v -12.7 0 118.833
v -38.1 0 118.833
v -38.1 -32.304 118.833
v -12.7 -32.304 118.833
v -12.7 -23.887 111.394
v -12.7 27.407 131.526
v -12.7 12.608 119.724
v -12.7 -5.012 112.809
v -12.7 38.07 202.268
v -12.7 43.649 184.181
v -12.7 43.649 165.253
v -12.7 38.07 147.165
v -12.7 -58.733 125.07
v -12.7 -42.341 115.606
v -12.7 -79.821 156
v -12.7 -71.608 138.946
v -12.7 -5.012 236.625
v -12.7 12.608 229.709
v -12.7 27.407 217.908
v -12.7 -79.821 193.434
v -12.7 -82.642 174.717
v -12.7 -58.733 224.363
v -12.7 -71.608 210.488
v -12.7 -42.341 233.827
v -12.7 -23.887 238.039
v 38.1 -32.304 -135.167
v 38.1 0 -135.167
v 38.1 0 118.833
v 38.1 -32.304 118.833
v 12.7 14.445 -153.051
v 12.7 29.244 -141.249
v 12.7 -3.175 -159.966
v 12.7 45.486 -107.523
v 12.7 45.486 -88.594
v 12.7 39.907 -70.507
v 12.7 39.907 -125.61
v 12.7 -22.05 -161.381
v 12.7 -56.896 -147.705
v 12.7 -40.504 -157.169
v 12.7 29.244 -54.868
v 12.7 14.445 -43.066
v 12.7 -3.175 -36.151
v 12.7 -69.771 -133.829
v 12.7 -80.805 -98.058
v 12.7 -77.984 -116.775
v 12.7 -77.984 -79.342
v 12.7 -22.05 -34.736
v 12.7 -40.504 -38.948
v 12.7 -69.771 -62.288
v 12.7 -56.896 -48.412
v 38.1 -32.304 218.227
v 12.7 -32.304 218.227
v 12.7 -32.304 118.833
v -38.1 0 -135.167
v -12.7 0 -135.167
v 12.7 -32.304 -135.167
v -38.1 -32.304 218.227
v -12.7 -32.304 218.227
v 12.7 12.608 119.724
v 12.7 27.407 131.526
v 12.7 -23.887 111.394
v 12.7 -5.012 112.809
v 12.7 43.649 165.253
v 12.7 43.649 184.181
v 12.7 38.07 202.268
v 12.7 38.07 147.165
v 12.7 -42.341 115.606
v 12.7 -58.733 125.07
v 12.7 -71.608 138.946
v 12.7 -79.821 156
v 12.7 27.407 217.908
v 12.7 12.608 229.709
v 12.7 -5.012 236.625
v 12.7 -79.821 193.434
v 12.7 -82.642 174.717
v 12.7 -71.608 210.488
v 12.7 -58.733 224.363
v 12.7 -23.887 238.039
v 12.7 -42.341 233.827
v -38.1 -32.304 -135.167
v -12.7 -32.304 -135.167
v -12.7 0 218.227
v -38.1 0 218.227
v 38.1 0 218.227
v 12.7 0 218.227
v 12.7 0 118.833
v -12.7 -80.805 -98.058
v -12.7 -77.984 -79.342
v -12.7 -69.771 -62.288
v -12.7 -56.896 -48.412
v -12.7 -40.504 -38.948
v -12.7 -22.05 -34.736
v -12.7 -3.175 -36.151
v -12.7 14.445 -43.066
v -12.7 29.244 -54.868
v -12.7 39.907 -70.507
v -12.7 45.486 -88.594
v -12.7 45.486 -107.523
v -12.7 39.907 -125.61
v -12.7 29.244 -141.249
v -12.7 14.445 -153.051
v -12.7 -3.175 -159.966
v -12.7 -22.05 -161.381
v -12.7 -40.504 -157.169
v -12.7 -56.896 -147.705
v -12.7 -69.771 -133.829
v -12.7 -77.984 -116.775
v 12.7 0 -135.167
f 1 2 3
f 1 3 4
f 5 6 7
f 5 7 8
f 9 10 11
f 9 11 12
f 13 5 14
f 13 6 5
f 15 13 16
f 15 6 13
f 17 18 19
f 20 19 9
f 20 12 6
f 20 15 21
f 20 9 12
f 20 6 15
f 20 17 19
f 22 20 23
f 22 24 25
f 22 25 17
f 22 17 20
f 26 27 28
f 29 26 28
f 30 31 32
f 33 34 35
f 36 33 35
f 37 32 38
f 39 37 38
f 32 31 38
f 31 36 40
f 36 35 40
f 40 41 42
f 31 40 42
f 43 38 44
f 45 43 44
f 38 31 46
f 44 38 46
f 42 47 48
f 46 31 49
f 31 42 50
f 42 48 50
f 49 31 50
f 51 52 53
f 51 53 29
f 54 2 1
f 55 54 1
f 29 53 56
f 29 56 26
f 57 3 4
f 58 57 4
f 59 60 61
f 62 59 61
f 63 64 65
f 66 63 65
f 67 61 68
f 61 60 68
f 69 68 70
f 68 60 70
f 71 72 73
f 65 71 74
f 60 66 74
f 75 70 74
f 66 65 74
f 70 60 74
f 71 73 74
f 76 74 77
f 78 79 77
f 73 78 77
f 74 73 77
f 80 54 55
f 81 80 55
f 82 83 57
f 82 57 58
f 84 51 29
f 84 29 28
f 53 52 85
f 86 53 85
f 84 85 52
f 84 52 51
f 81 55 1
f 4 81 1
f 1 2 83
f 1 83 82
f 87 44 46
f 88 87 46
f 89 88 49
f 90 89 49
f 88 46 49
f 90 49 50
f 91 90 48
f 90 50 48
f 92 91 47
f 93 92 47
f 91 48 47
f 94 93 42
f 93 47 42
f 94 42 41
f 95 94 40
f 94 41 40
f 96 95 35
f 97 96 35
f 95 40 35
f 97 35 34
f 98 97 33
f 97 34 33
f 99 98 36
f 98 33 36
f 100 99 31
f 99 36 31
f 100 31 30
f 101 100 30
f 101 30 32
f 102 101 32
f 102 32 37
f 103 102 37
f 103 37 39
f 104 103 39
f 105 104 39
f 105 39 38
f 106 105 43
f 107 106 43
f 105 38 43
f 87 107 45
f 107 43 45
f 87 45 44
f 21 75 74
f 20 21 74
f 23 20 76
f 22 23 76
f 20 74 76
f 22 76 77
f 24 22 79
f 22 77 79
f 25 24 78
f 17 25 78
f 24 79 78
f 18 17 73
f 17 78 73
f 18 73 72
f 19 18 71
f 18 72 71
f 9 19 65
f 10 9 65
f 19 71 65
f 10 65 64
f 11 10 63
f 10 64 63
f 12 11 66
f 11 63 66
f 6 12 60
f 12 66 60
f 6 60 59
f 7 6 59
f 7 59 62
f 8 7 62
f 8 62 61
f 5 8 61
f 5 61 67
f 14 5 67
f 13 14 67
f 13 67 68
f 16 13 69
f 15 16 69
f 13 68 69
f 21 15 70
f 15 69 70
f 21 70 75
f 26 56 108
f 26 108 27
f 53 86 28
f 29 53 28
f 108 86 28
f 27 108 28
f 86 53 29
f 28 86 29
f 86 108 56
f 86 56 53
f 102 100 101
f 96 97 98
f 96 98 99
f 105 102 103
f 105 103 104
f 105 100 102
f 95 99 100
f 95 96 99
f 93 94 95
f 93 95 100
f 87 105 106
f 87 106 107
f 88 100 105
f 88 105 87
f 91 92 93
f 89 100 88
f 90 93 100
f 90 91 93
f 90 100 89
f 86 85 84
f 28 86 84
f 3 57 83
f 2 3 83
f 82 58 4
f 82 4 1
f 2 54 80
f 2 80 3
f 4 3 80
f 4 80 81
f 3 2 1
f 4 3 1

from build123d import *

# Parameters (mm, degrees)
F0_W      = 25.4
F0_H      = 254
F2_DEPTH  = 32.304034
F2_FACE_W = 25.4
F2_FACE_H = 32.304034
F3_DEPTH  = 99.393887
F4_R      = 63.5
F5_DEPTH  = 25.4


with BuildPart() as f2:
    # F0 (on Front) → F2 (new body)
    with BuildSketch(Plane.XZ):
        with Locations((-25.4, -8.166723)):
            Rectangle(F0_W, F0_H)
        with Locations((25.4, -8.166723)):
            Rectangle(F0_W, F0_H)
    extrude(amount=F2_DEPTH)


with BuildPart() as f3:
    # F2_face (on face) → F3 (new body)
    with BuildSketch(Plane(origin=(25.4, -16.152017, 118.833277), x_dir=(1, 0, 0), z_dir=(0, 0, 1))):
        Rectangle(F2_FACE_W, F2_FACE_H)
        with Locations((-50.8, 0)):
            Rectangle(F2_FACE_W, F2_FACE_H)
    extrude(amount=F3_DEPTH)


with BuildPart() as f5:
    # F4 (on face) → F5 (new body)
    with BuildSketch(Plane(origin=(12.7, 0, 0), x_dir=(0, -1, 0), z_dir=(-1, 0, 0))):
        with Locations((19.141689, 174.716711)):
            Circle(F4_R)
        with Locations((17.304808, -98.058484)):
            Circle(F4_R)
    extrude(amount=F5_DEPTH)


solid = Compound([f2.part, f3.part, f5.part])
